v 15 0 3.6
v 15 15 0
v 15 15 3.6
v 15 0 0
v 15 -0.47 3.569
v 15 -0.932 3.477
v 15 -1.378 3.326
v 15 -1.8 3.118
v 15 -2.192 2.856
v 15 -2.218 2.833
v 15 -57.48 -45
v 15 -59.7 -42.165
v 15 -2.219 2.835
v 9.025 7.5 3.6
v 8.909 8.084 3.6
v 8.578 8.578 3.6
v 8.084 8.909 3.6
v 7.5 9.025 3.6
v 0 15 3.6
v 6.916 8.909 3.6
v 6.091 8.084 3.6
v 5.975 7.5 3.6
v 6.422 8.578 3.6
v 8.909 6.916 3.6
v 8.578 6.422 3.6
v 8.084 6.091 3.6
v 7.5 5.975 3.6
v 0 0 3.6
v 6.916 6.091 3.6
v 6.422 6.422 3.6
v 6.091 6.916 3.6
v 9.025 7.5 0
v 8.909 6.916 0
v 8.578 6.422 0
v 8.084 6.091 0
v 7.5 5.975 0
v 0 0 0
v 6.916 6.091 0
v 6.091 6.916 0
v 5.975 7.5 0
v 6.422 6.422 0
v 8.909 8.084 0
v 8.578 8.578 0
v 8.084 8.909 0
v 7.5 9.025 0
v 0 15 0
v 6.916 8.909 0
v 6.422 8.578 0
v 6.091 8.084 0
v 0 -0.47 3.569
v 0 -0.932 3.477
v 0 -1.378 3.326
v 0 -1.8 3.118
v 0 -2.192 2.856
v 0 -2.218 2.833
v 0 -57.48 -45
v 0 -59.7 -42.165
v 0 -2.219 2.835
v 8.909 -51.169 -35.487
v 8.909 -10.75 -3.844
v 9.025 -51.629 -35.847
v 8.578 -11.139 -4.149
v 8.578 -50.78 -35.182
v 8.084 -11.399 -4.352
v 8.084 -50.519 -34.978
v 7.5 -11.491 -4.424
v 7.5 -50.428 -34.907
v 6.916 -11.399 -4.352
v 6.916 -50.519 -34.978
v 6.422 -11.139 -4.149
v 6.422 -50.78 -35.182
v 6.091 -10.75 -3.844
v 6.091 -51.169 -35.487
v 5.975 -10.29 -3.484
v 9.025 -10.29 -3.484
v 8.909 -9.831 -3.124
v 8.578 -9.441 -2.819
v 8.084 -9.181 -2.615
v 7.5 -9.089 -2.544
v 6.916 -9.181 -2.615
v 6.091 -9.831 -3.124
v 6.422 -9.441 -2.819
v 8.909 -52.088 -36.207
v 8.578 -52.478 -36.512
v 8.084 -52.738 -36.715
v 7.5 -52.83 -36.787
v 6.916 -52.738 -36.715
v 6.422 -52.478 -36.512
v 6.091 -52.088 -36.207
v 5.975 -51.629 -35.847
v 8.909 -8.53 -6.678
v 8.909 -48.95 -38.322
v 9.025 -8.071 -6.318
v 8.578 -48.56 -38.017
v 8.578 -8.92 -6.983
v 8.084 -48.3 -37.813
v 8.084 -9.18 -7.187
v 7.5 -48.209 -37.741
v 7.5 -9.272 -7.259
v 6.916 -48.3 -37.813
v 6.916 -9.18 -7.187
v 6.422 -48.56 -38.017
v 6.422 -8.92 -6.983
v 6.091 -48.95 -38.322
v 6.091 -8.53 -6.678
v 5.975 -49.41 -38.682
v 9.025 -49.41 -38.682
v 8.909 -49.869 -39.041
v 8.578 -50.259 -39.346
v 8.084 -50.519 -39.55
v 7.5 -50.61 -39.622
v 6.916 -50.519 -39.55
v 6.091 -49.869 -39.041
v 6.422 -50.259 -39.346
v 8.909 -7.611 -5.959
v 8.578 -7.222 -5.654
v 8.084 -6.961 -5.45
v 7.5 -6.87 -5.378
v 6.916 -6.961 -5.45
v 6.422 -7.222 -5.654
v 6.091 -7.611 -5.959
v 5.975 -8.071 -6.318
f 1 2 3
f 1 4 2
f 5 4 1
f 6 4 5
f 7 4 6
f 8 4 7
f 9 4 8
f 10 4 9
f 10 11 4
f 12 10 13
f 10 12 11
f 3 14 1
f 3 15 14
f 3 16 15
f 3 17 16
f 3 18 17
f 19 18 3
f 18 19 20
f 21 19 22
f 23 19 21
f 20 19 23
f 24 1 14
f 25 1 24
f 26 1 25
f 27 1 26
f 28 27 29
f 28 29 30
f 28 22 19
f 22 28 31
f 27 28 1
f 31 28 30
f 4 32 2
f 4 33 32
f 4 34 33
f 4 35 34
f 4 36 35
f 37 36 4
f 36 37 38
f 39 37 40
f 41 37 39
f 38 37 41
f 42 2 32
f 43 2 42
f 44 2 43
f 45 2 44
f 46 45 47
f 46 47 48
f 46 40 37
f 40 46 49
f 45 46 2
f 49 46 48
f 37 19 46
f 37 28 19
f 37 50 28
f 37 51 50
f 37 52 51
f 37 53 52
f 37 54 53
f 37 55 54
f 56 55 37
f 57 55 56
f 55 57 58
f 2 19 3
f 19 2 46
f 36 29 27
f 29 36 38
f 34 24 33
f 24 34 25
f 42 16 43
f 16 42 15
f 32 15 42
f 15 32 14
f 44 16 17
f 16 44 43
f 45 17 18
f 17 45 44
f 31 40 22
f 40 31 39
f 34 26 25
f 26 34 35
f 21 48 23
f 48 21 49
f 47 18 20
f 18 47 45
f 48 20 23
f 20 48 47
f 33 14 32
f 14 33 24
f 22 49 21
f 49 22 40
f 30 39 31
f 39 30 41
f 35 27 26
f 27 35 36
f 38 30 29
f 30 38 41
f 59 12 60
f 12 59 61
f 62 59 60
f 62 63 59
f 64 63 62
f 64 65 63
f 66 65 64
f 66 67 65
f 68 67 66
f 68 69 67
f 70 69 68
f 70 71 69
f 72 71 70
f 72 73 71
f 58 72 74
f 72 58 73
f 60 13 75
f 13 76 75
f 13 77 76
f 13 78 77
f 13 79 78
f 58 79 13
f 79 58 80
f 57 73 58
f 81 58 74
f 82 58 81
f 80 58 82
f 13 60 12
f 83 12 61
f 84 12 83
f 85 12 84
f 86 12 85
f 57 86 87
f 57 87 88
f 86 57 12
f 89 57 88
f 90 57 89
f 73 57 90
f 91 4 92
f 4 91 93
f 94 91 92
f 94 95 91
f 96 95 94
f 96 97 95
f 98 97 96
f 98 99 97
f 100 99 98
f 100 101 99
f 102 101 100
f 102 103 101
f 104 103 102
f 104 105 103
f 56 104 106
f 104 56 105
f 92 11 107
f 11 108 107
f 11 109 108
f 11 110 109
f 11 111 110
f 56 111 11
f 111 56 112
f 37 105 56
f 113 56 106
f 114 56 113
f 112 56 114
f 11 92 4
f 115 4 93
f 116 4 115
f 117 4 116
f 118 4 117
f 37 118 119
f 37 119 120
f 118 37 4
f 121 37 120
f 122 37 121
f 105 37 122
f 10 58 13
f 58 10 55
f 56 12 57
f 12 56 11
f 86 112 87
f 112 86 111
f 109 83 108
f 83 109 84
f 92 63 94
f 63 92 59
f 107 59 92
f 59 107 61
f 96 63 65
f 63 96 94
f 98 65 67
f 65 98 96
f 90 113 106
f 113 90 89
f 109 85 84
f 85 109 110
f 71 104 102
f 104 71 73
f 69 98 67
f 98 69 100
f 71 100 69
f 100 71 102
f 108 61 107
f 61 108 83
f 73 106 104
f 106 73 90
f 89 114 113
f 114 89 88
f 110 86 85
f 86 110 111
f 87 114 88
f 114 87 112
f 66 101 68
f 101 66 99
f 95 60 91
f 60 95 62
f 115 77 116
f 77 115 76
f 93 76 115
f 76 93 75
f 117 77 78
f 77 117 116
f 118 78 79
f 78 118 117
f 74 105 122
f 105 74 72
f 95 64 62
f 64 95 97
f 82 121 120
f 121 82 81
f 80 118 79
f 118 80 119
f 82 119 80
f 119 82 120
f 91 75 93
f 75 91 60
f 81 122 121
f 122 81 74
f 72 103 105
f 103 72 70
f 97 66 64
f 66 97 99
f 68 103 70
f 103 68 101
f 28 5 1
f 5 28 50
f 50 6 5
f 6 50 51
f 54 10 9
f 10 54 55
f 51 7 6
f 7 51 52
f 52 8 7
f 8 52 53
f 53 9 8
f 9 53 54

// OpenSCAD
// file: configuration.scad
// Increase this if your slicer or printer make holes too tight.
extra_radius = 0.1;
extra_extrusion_width = 0.5;

// OD = outside diameter, corner to corner.
m3_nut_od = 6.1;
m3_nut_radius = m3_nut_od/2 + 0.35 + extra_radius;
m3_washer_radius = 3.5 + extra_radius;

// Major diameter of metric 3mm thread.
m3_major = 2.85;
m3_radius = m3_major/2 + extra_radius;
m3_wide_radius = m3_major/2 + extra_radius;

// NEMA17 stepper motors.
motor_shaft_diameter = 5;
motor_shaft_radius = motor_shaft_diameter/2 + extra_radius;

// Frame brackets. M3x8mm screws work best with 3.6 mm brackets.
thickness = 3.6;

// OpenBeam or Misumi. Currently only 15x15 mm, but there is a plan
// to make models more parametric and allow 20x20 mm in the future.
extrusion = 15;

// Placement for the NEMA17 stepper motors.
motor_offset = 44;
motor_length = 47;
// main file
include <configuration.scad>;

width = 15;

panel_height = 73;
printer_height = 45;
screw_separation = (49+56)/2; //center to center distance between mounting screws

angle = asin(printer_height/panel_height);

module lcd_holder(){
	union(){
		difference(){
			cube([width,extrusion,thickness]);
			translate([width/2,extrusion/2,thickness/2])
				cylinder(r=m3_wide_radius, h=2*thickness, center=true, $fn=16);
		}
		rotate([angle, 0, 0]) translate([0,-panel_height,0])
			difference(){
				cube([width, panel_height, thickness]);
				translate([width/2,(panel_height-screw_separation)/2,thickness/2])
					cylinder(r=m3_wide_radius, h=2*thickness, center=true, $fn=16);
				translate([width/2,panel_height-(panel_height-screw_separation)/2,thickness/2])
					cylinder(r=m3_wide_radius, h=2*thickness, center=true, $fn=16);
			}
		difference(){
			rotate([0,90,0])
				cylinder(r=thickness, h=15, $fn=48);
			translate([7.5,0,-thickness])
				cube([30, 20, thickness*2], center=true);
		}
	}
}

lcd_holder();
